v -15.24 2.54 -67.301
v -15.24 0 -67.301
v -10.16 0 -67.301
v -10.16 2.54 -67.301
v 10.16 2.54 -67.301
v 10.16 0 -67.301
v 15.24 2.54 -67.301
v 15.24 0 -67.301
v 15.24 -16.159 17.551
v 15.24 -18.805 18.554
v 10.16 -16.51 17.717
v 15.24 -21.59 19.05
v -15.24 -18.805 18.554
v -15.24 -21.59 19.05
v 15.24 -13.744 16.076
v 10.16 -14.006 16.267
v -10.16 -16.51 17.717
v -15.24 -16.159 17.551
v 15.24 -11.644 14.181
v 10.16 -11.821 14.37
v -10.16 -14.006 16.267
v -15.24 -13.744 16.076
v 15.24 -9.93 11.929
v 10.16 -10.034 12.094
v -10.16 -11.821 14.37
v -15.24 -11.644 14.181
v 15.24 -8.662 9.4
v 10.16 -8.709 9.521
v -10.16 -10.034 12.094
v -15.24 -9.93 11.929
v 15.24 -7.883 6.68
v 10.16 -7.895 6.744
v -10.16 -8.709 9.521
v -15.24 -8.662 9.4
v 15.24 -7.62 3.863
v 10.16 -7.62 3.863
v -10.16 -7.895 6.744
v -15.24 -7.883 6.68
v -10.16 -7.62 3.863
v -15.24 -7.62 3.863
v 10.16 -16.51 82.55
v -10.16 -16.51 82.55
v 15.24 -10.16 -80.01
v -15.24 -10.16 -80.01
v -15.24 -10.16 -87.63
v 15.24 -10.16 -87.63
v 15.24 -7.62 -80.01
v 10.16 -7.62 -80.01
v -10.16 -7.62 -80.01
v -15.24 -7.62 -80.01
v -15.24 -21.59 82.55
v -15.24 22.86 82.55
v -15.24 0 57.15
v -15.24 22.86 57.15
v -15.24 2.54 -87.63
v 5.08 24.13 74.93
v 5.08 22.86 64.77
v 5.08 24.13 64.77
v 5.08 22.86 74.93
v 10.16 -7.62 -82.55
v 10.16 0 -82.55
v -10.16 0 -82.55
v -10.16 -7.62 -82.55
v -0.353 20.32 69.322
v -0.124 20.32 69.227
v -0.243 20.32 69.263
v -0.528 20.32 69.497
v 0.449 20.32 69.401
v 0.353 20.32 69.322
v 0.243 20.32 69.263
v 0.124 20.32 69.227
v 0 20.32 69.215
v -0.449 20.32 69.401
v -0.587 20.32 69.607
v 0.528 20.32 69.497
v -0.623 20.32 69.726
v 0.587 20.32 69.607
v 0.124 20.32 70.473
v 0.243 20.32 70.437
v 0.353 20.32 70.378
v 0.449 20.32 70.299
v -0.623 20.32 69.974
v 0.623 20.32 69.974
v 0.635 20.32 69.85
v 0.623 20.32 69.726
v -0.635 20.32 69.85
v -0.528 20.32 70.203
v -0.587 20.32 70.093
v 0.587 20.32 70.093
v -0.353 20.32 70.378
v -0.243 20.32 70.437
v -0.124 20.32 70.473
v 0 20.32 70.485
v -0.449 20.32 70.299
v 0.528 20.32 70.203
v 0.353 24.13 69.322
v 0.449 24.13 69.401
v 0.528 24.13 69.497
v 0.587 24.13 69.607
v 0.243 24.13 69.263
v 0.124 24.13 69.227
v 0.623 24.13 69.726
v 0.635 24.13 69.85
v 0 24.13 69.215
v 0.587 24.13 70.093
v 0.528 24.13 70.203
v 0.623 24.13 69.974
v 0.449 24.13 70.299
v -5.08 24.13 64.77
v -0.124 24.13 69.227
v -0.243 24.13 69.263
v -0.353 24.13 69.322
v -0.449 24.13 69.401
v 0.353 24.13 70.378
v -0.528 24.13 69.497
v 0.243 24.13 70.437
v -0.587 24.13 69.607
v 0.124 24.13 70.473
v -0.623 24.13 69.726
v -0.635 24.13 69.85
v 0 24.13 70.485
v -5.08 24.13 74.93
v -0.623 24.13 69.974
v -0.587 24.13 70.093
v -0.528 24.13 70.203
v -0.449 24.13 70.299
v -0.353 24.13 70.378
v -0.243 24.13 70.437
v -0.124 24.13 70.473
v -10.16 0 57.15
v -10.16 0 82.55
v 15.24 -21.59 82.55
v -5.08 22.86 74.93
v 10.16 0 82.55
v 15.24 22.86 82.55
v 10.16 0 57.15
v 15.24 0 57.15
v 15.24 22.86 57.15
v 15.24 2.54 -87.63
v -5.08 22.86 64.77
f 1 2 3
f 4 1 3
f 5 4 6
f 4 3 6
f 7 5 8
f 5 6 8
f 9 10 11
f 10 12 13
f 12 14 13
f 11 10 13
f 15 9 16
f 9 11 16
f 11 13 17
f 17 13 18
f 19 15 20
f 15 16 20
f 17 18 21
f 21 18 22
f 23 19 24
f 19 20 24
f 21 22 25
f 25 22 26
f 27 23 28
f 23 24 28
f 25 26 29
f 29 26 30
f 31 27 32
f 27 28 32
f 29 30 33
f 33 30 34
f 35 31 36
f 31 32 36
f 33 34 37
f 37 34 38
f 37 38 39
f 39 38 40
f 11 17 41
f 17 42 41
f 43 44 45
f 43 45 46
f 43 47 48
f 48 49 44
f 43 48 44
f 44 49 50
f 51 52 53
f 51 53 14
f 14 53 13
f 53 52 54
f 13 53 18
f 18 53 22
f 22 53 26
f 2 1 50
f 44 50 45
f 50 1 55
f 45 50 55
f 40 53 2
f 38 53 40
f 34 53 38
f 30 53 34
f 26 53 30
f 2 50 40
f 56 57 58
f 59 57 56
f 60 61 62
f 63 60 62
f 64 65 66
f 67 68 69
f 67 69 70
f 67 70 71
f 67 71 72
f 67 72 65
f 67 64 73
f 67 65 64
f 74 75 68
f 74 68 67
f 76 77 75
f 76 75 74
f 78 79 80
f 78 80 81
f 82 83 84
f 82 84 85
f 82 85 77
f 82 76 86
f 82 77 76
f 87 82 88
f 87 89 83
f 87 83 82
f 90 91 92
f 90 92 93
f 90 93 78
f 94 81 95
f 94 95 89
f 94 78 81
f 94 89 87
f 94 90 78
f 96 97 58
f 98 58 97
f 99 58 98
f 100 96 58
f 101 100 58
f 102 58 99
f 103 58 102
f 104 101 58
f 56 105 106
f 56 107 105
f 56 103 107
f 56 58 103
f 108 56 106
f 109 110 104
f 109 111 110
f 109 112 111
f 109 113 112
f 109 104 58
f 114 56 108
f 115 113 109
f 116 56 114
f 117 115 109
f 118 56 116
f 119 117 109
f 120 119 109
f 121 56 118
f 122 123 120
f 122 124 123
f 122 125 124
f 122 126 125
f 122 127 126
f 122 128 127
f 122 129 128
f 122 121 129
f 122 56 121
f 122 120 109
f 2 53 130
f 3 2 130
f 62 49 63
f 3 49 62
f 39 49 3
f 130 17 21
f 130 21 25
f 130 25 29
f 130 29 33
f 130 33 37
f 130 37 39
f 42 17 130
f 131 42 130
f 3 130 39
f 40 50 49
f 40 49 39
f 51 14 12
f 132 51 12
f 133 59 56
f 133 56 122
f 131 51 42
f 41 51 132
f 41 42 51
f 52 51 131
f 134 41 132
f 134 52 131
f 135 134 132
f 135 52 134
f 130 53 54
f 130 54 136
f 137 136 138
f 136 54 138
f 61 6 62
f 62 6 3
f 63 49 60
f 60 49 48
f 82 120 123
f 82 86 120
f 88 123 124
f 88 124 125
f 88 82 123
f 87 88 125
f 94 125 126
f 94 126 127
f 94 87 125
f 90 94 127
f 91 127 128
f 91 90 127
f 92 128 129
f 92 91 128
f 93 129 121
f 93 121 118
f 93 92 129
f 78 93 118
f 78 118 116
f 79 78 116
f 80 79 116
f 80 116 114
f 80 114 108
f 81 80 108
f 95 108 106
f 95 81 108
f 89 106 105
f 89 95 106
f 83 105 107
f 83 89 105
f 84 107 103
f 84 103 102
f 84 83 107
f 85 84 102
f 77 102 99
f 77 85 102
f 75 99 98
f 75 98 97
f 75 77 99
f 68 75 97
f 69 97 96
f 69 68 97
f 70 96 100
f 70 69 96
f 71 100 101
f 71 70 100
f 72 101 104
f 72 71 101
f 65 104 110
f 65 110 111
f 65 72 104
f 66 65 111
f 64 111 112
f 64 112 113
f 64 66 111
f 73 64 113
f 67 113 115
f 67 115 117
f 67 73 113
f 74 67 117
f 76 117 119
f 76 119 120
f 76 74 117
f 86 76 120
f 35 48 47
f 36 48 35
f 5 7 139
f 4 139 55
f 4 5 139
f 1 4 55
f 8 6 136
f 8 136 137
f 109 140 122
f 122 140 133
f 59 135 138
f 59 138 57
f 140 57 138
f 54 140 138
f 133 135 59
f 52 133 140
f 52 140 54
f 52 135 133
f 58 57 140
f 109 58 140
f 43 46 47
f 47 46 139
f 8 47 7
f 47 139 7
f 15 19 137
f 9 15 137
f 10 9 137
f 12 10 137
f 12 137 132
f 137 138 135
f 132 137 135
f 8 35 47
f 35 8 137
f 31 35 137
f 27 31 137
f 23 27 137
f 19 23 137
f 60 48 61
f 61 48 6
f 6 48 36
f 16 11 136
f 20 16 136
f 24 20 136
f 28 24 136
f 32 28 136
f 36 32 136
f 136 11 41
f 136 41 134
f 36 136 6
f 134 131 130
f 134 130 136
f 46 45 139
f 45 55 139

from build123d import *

# Parameters (mm, degrees)
F1_DEPTH     = 16.51
F2_W         = 8.89
F2_H         = 106.68
F3_DEPTH     = 50.8
F4_W         = 5.08
F4_H         = 63.5
F4_W_2       = 25.4
F5_DEPTH     = 5.08
F6_T1_DEPTH  = 5.08
F6_T6_DEPTH  = 43.0474778593
F6_T12_DEPTH = 81.0149557187
F8_DEPTH     = 25.4
F9_W         = 20.32
F9_H         = 15.2493301511
F10_DEPTH    = 2.54
F11_W        = 20.32
F11_H        = 2.54
F12_DEPTH    = 2.54
F13_R        = 0.635
F14_DEPTH    = 2.54
F15_W        = 10.16
F15_H        = 10.16
F15_R        = 0.635
F16_DEPTH    = 1.27


# Not quite as in the source:
# - a fillet or chamfer that OpenCascade refuses, or shapes differently, is made with other operations: its cross-section is extruded or revolved along the edge and cut away or added


with BuildPart() as f1:
    # F0 (on Front) → F1 (new body)
    with BuildSketch(Plane.XZ):
        Polygon((15.24, 6.35), (15.24, 82.55), (10.16, 82.55), (10.16, -82.55), (-10.16, -82.55), (-10.16, 82.55), (-15.24, 82.55), (-15.24, 6.35), (-15.24, -87.63), (15.24, -87.63), align=None)
    extrude(amount=F1_DEPTH)

    # F2 (on face) → F3 (cut)
    with BuildSketch(Plane(origin=(-15.24, 0, 0), x_dir=(0, -1, 0), z_dir=(-1, 0, 0))):
        with Locations((12.065, -34.29)):
            Rectangle(F2_W, F2_H)
    extrude(amount=-F3_DEPTH, mode=Mode.SUBTRACT)

    # F4 (on face) → F5 (join)
    with BuildSketch(Plane.XZ.offset(16.51)):
        with Locations((-12.7, 50.8)):
            Rectangle(F4_W, F4_H)
        with Locations((2.54, 50.8)):
            Rectangle(F4_W_2, F4_H)
    extrude(amount=F5_DEPTH)

    # F6: fillet of radius 15.24 on 1 edges, made by hand

    # F6_s2 → F6_t1 (join)
    with BuildSketch(Plane.YZ.offset(-15.24)):
        with BuildLine():
            ThreePointArc((-21.59, 19.05), (-11.6436636998, 14.1805376301), (-7.62, 3.8630088563))
            Line((-7.62, 3.8630088563), (-7.62, 19.05))
            Line((-7.62, 19.05), (-21.59, 19.05))
        make_face()
    extrude(amount=F6_T1_DEPTH)


with BuildPart() as f6_tool4:
    # F6_s5 → F6_t6 (new body)
    with BuildSketch(Plane.YZ.offset(-15.24)):
        with BuildLine():
            ThreePointArc((-21.59, 19.05), (-11.6436636998, 14.1805376301), (-7.62, 3.8630088563))
            Line((-7.62, 3.8630088563), (-7.62, 19.05))
            Line((-7.62, 19.05), (-21.59, 19.05))
        make_face()
    extrude(amount=F6_T6_DEPTH)

    split(bisect_by=Plane.YZ.offset(15.24), keep=Keep.BOTTOM)

    split(bisect_by=Plane.XZ.offset(16.51), keep=Keep.TOP)


with BuildPart() as f1_1:
    add(f1.part)

    # F6_t3: union F6_tool4
    add(f6_tool4.part)


with BuildPart() as f6_tool10:
    # F6_s11 → F6_t12 (new body)
    with BuildSketch(Plane.YZ.offset(-53.2074778593)):
        with BuildLine():
            ThreePointArc((-21.59, 19.05), (-11.6436636998, 14.1805376301), (-7.62, 3.8630088563))
            Line((-7.62, 3.8630088563), (-7.62, 19.05))
            Line((-7.62, 19.05), (-21.59, 19.05))
        make_face()
    extrude(amount=F6_T12_DEPTH)

    split(bisect_by=Plane.YZ.offset(15.24), keep=Keep.BOTTOM)

    split(bisect_by=Plane.YZ.offset(10.16), keep=Keep.TOP)


with BuildPart() as f1_2:
    add(f1_1.part)

    # F6_t9: union F6_tool10
    add(f6_tool10.part)

    # F7 (on face) → F8 (join)
    with BuildSketch(Plane.XY.offset(82.55)):
        Polygon((10.16, 0), (15.24, 0), (15.24, 22.86), (-15.24, 22.86), (-15.24, 0), (-10.16, 0), align=None)
    extrude(amount=-F8_DEPTH)

    # F9 (on face) → F10 (join)
    with BuildSketch(Plane(origin=(0, 0, 0), x_dir=(-1, 0, 0), z_dir=(0, 1, 0))):
        Polygon((-15.24, -67.3006698489), (-15.24, -87.63), (15.24, -87.63), (15.24, -67.3006698489), (10.16, -67.3006698489), (10.16, -82.55), (-10.16, -82.55), (-10.16, -67.3006698489), align=None)
        with Locations((0, -74.9253349245)):
            Rectangle(F9_W, F9_H)
    extrude(amount=F10_DEPTH)

    # F11 (on face) → F12 (join)
    with BuildSketch(Plane.XZ.offset(7.62)):
        with Locations((0, -81.28)):
            Rectangle(F11_W, F11_H)
        Polygon((-15.24, -80.01), (-15.24, -87.63), (15.24, -87.63), (15.24, -80.01), (10.16, -80.01), (10.16, -82.55), (-10.16, -82.55), (-10.16, -80.01), align=None)
    extrude(amount=F12_DEPTH)

    # F13 (on face) → F14 (cut)
    with BuildSketch(Plane(origin=(0, 22.86, 0), x_dir=(-1, 0, 0), z_dir=(0, 1, 0))):
        with Locations((0, 69.85)):
            Circle(F13_R)
    extrude(amount=-F14_DEPTH, mode=Mode.SUBTRACT)

    # F15 (on face) → F16 (join)
    with BuildSketch(Plane(origin=(0, 22.86, 0), x_dir=(-1, 0, 0), z_dir=(0, 1, 0))):
        with Locations((0, 69.85)):
            Rectangle(F15_W, F15_H)
        with Locations((0, 69.85)):
            Circle(F15_R, mode=Mode.SUBTRACT)
    extrude(amount=F16_DEPTH)


solid = f1_2.part
